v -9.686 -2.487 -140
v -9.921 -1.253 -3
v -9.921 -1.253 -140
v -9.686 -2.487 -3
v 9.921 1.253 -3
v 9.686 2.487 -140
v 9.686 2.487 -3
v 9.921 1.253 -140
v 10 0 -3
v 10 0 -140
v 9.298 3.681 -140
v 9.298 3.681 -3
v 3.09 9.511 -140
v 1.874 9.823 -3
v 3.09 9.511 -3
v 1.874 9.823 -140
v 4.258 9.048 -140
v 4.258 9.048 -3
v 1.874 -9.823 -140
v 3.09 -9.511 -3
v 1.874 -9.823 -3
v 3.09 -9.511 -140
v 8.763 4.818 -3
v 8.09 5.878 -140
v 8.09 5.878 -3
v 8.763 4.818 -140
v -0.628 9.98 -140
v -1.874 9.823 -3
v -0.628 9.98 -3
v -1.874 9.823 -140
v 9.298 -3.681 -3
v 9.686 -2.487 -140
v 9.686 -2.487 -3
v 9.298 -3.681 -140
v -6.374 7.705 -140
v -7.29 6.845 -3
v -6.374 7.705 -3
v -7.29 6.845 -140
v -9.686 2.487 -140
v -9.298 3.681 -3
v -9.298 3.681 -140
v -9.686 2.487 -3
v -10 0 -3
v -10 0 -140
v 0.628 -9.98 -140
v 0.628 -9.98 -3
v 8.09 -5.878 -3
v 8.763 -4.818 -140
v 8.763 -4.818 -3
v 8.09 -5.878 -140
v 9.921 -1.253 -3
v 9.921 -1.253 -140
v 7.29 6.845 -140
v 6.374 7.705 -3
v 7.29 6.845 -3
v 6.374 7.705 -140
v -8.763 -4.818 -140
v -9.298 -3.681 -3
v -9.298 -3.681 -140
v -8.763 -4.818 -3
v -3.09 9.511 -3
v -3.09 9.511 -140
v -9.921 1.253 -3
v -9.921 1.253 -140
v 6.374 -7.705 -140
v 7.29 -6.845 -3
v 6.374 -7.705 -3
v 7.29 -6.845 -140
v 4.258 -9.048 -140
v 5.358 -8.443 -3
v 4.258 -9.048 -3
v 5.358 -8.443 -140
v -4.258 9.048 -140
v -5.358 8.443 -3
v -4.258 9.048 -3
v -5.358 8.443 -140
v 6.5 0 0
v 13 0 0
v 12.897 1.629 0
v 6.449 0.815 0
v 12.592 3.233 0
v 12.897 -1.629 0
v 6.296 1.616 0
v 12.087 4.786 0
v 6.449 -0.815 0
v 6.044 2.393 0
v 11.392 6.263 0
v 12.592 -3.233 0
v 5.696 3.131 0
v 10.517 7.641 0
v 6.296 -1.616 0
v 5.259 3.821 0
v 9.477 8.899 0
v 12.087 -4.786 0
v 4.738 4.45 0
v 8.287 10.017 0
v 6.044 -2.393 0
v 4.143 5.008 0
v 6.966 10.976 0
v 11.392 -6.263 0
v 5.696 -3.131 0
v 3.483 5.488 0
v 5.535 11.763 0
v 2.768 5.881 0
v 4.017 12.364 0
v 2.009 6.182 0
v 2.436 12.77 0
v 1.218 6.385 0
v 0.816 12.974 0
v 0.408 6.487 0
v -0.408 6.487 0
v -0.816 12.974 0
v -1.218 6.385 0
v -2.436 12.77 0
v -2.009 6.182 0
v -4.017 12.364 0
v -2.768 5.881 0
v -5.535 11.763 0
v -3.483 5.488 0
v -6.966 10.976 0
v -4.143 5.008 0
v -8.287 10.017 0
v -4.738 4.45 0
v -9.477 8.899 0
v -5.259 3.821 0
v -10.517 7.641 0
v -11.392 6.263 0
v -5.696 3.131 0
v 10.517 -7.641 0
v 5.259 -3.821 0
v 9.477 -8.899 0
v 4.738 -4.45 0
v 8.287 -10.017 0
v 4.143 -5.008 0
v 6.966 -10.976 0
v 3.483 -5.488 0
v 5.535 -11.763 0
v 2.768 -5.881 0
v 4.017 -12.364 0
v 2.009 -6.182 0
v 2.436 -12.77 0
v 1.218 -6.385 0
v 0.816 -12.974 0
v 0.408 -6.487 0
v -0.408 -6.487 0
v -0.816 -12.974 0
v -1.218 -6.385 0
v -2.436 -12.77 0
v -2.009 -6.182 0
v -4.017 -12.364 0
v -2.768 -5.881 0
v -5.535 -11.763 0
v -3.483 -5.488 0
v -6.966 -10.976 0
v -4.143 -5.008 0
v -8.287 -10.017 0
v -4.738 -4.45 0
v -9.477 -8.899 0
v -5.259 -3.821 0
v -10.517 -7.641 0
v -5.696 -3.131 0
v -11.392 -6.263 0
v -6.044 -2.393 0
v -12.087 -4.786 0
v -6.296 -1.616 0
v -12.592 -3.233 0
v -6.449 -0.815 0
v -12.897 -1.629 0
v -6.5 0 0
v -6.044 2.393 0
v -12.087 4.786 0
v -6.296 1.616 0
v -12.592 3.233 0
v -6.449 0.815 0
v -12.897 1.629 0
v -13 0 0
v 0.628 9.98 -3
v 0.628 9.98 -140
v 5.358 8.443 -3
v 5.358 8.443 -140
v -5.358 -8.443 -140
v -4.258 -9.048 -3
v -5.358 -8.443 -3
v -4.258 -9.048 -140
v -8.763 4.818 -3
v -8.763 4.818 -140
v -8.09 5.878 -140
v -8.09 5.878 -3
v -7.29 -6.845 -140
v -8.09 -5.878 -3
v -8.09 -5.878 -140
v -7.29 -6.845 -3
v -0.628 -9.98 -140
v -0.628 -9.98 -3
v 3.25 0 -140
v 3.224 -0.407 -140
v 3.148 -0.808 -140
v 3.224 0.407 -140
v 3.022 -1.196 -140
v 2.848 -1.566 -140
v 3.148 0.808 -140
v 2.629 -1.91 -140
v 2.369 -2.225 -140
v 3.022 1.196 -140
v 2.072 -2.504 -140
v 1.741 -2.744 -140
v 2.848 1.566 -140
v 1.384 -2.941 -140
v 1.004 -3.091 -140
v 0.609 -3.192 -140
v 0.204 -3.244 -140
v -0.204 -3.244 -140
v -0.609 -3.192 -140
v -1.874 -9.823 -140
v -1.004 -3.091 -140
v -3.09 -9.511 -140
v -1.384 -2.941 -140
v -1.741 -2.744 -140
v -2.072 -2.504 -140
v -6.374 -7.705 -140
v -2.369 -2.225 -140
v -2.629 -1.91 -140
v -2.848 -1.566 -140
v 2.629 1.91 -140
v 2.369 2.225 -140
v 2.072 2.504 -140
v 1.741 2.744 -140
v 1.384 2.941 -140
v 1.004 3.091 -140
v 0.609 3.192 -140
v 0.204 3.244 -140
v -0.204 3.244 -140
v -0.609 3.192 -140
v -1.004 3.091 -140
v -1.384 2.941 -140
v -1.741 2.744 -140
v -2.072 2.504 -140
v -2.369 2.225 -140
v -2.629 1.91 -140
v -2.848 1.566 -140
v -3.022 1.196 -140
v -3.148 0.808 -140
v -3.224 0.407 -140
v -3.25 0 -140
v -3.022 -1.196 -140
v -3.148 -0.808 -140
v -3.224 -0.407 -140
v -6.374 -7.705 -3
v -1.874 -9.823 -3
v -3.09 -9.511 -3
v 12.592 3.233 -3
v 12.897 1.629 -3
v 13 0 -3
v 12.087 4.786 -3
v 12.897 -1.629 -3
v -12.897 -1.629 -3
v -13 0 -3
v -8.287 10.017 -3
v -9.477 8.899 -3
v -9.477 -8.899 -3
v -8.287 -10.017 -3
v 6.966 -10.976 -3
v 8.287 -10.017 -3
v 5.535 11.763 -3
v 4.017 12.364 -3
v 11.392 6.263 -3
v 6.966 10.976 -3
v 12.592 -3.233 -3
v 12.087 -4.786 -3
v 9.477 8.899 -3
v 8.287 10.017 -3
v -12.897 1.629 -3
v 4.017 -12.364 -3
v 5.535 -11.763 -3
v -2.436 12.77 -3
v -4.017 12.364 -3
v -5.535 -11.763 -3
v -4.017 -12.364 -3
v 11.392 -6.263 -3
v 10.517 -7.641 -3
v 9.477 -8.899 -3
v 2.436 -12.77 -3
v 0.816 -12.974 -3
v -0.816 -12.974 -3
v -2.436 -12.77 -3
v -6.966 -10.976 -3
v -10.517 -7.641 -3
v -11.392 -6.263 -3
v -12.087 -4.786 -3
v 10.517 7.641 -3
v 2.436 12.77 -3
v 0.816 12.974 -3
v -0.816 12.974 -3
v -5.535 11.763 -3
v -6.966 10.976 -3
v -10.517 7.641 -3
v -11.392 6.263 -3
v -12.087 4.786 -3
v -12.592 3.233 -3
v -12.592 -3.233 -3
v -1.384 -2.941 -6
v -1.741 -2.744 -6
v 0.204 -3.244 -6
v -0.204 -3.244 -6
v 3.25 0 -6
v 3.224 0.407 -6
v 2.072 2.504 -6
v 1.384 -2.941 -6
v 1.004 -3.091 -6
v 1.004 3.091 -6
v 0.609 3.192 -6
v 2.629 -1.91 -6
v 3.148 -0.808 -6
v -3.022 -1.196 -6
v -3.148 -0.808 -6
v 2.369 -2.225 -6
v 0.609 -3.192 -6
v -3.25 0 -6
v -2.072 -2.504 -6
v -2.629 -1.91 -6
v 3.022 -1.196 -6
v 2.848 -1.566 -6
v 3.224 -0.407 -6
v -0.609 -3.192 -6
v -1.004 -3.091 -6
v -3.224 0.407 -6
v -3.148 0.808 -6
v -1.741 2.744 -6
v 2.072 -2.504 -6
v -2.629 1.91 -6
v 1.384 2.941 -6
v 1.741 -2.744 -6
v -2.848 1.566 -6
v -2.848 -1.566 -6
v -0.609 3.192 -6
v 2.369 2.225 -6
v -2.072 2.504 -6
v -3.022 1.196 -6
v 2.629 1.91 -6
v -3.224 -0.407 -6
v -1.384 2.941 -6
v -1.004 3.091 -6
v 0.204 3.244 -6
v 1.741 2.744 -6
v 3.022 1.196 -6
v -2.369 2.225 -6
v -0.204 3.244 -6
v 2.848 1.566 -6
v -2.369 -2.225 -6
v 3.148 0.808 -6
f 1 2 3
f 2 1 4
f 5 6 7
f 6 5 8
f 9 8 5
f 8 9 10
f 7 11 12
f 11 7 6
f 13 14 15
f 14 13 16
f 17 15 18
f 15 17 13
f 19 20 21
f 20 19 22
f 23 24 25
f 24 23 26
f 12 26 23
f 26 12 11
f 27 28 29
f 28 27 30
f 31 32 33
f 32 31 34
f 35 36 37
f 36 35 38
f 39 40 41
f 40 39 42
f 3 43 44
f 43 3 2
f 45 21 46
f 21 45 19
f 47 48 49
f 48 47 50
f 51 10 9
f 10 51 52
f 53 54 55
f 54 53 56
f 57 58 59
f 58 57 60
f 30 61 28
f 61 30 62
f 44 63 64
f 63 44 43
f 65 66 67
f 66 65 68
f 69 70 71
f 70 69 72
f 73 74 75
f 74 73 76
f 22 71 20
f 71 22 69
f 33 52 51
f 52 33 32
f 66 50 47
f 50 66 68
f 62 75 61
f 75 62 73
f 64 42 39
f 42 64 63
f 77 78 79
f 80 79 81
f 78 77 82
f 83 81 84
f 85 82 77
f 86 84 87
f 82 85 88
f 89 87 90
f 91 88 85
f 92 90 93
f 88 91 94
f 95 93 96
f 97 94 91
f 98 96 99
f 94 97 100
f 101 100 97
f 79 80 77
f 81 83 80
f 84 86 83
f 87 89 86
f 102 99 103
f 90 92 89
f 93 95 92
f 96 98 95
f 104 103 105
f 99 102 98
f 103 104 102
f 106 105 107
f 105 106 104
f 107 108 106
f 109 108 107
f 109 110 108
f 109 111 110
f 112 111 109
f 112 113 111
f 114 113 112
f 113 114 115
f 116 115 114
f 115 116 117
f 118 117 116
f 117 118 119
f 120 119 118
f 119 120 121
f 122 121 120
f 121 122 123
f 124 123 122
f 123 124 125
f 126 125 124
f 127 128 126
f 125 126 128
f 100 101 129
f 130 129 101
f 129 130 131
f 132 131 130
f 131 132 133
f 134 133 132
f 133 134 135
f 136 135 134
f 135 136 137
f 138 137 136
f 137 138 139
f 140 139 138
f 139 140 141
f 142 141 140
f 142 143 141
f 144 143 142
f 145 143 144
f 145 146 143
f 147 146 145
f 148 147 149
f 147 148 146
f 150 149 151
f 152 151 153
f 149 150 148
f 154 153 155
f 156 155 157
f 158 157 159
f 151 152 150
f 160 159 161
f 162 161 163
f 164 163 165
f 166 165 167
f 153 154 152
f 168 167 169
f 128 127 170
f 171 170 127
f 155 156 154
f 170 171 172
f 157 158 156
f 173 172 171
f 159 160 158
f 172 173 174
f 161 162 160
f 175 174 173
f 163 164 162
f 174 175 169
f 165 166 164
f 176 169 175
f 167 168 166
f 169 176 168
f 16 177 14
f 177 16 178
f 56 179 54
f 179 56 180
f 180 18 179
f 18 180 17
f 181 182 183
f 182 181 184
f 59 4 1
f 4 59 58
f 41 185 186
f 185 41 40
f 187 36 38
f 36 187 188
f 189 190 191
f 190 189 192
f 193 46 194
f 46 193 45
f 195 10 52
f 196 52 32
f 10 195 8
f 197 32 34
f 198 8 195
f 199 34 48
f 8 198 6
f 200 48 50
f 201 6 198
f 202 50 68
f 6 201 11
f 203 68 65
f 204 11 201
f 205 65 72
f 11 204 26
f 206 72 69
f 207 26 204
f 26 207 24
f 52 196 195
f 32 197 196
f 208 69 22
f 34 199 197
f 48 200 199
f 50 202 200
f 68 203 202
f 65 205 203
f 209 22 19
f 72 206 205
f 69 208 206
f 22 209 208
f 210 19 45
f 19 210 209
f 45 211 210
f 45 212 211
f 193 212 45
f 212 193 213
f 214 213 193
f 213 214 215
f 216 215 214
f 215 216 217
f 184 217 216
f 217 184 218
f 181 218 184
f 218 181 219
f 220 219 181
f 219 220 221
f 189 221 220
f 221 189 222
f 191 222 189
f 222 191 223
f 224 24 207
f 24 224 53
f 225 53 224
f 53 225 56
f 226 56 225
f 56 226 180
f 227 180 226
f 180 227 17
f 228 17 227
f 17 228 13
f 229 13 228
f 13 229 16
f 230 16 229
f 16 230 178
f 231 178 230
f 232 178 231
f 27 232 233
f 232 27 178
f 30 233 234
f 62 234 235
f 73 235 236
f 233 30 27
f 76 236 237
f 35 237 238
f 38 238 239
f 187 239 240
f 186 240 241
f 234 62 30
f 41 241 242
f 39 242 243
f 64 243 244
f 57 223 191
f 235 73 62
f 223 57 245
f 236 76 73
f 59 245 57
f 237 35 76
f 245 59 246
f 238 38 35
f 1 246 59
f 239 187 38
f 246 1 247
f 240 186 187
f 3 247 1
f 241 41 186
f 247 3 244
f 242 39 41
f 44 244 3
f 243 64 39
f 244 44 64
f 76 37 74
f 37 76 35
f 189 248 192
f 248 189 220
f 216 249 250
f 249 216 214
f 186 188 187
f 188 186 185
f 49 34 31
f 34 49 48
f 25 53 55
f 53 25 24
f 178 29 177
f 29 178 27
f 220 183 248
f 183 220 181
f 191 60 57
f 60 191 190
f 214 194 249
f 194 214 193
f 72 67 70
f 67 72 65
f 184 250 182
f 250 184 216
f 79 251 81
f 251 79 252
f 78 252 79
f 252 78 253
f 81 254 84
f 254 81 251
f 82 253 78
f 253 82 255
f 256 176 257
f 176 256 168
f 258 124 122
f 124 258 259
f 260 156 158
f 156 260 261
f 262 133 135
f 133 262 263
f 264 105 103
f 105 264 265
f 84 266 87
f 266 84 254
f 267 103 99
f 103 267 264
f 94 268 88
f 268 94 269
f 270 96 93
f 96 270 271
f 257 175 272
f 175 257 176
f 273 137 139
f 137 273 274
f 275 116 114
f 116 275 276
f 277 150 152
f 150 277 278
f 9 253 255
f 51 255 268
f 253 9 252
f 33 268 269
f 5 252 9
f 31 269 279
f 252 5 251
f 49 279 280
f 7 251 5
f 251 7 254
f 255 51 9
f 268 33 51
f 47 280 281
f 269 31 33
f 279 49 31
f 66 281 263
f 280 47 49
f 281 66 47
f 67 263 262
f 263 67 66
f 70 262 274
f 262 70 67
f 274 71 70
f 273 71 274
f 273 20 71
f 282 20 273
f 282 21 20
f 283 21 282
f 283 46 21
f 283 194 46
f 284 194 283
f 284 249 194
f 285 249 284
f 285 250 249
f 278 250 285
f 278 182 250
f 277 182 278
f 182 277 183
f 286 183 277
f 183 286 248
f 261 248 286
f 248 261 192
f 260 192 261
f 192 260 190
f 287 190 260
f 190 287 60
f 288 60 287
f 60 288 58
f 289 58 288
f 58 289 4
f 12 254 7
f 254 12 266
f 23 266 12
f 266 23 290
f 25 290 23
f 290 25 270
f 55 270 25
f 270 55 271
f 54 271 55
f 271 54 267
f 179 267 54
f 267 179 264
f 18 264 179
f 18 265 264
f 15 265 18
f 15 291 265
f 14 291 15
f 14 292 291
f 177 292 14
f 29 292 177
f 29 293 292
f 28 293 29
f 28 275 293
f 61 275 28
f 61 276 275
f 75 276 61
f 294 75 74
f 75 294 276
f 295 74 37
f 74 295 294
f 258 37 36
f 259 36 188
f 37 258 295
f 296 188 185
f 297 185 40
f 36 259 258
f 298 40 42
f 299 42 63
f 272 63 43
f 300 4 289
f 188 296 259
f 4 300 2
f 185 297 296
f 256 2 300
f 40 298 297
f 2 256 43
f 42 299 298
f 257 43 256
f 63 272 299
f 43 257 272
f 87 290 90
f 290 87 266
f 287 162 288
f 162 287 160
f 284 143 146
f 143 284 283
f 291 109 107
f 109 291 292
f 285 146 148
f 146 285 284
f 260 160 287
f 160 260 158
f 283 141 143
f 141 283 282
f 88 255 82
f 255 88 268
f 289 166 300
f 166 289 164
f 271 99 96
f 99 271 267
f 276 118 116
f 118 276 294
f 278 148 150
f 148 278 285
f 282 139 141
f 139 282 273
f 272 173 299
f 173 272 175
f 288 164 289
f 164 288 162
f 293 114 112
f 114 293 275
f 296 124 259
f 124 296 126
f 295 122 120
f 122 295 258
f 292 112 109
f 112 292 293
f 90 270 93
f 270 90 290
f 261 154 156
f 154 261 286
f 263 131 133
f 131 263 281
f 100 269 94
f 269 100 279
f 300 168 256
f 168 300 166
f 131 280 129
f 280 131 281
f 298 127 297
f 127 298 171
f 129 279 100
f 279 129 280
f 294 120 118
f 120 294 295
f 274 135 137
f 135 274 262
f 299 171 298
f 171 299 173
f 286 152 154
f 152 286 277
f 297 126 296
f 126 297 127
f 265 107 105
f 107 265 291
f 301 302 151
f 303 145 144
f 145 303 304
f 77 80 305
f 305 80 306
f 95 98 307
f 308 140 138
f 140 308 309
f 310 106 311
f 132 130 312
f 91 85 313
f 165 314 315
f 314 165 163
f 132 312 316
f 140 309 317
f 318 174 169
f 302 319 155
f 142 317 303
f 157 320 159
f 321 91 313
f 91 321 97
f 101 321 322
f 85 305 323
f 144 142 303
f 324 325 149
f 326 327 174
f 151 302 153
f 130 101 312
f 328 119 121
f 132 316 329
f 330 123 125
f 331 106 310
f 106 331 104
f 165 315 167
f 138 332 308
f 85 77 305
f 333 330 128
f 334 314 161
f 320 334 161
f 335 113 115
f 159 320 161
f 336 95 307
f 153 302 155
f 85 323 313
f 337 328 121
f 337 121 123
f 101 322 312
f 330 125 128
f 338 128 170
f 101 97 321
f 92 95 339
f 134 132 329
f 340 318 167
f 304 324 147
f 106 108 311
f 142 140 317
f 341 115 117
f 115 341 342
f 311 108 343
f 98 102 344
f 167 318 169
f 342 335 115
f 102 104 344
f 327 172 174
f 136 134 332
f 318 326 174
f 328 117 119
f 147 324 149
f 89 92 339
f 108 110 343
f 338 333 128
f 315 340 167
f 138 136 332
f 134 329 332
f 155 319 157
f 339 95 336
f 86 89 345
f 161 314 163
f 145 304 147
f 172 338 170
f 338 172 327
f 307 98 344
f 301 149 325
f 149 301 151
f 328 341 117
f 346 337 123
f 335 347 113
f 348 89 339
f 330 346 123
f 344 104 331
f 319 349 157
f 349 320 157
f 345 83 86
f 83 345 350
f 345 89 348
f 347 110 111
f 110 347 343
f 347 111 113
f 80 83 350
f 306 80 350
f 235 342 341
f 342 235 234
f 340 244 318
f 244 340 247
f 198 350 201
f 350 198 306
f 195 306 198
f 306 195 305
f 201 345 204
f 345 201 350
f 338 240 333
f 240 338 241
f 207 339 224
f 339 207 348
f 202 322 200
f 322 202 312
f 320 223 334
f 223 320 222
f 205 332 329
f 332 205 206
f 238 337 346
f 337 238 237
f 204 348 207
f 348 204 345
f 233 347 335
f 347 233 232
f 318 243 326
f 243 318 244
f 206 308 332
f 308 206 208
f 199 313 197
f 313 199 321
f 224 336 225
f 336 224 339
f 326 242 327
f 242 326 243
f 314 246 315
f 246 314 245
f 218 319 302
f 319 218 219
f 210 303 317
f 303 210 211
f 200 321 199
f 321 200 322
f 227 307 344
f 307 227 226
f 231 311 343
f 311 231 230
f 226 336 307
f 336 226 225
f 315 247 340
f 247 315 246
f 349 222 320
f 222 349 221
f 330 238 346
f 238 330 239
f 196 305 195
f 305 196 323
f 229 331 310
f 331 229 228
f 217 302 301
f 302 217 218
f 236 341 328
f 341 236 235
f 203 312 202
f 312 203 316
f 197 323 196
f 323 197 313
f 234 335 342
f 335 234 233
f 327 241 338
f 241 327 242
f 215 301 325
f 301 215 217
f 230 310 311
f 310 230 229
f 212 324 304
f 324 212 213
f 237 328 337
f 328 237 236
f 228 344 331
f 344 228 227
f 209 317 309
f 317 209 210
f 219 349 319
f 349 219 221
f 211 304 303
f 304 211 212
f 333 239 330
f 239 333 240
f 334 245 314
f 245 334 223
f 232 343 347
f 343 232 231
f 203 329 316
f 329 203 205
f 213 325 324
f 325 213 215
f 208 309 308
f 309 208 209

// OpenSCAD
$fn = 50;


difference() {
	union() {
		translate(v = [0, 0, -140.0000000000]) {
			cylinder(h = 140, r = 10.0000000000);
		}
		translate(v = [0, 0, -3.0000000000]) {
			cylinder(h = 3, r = 13.0000000000);
		}
	}
	union() {
		translate(v = [0, 0, 0]) {
			rotate(a = [0, 0, 0]) {
				difference() {
					union() {
						#translate(v = [0, 0, -140.0000000000]) {
							cylinder(h = 140, r = 2.2500000000);
						}
						#translate(v = [0, 0, -6]) {
							cylinder(h = 6, r1 = 3.2500000000, r2 = 6.5000000000);
						}
						#translate(v = [0, 0, -140.0000000000]) {
							cylinder(h = 140, r = 3.2500000000);
						}
						#translate(v = [0, 0, -140.0000000000]) {
							cylinder(h = 140, r = 2.2500000000);
						}
					}
					union();
				}
			}
		}
	}
}
